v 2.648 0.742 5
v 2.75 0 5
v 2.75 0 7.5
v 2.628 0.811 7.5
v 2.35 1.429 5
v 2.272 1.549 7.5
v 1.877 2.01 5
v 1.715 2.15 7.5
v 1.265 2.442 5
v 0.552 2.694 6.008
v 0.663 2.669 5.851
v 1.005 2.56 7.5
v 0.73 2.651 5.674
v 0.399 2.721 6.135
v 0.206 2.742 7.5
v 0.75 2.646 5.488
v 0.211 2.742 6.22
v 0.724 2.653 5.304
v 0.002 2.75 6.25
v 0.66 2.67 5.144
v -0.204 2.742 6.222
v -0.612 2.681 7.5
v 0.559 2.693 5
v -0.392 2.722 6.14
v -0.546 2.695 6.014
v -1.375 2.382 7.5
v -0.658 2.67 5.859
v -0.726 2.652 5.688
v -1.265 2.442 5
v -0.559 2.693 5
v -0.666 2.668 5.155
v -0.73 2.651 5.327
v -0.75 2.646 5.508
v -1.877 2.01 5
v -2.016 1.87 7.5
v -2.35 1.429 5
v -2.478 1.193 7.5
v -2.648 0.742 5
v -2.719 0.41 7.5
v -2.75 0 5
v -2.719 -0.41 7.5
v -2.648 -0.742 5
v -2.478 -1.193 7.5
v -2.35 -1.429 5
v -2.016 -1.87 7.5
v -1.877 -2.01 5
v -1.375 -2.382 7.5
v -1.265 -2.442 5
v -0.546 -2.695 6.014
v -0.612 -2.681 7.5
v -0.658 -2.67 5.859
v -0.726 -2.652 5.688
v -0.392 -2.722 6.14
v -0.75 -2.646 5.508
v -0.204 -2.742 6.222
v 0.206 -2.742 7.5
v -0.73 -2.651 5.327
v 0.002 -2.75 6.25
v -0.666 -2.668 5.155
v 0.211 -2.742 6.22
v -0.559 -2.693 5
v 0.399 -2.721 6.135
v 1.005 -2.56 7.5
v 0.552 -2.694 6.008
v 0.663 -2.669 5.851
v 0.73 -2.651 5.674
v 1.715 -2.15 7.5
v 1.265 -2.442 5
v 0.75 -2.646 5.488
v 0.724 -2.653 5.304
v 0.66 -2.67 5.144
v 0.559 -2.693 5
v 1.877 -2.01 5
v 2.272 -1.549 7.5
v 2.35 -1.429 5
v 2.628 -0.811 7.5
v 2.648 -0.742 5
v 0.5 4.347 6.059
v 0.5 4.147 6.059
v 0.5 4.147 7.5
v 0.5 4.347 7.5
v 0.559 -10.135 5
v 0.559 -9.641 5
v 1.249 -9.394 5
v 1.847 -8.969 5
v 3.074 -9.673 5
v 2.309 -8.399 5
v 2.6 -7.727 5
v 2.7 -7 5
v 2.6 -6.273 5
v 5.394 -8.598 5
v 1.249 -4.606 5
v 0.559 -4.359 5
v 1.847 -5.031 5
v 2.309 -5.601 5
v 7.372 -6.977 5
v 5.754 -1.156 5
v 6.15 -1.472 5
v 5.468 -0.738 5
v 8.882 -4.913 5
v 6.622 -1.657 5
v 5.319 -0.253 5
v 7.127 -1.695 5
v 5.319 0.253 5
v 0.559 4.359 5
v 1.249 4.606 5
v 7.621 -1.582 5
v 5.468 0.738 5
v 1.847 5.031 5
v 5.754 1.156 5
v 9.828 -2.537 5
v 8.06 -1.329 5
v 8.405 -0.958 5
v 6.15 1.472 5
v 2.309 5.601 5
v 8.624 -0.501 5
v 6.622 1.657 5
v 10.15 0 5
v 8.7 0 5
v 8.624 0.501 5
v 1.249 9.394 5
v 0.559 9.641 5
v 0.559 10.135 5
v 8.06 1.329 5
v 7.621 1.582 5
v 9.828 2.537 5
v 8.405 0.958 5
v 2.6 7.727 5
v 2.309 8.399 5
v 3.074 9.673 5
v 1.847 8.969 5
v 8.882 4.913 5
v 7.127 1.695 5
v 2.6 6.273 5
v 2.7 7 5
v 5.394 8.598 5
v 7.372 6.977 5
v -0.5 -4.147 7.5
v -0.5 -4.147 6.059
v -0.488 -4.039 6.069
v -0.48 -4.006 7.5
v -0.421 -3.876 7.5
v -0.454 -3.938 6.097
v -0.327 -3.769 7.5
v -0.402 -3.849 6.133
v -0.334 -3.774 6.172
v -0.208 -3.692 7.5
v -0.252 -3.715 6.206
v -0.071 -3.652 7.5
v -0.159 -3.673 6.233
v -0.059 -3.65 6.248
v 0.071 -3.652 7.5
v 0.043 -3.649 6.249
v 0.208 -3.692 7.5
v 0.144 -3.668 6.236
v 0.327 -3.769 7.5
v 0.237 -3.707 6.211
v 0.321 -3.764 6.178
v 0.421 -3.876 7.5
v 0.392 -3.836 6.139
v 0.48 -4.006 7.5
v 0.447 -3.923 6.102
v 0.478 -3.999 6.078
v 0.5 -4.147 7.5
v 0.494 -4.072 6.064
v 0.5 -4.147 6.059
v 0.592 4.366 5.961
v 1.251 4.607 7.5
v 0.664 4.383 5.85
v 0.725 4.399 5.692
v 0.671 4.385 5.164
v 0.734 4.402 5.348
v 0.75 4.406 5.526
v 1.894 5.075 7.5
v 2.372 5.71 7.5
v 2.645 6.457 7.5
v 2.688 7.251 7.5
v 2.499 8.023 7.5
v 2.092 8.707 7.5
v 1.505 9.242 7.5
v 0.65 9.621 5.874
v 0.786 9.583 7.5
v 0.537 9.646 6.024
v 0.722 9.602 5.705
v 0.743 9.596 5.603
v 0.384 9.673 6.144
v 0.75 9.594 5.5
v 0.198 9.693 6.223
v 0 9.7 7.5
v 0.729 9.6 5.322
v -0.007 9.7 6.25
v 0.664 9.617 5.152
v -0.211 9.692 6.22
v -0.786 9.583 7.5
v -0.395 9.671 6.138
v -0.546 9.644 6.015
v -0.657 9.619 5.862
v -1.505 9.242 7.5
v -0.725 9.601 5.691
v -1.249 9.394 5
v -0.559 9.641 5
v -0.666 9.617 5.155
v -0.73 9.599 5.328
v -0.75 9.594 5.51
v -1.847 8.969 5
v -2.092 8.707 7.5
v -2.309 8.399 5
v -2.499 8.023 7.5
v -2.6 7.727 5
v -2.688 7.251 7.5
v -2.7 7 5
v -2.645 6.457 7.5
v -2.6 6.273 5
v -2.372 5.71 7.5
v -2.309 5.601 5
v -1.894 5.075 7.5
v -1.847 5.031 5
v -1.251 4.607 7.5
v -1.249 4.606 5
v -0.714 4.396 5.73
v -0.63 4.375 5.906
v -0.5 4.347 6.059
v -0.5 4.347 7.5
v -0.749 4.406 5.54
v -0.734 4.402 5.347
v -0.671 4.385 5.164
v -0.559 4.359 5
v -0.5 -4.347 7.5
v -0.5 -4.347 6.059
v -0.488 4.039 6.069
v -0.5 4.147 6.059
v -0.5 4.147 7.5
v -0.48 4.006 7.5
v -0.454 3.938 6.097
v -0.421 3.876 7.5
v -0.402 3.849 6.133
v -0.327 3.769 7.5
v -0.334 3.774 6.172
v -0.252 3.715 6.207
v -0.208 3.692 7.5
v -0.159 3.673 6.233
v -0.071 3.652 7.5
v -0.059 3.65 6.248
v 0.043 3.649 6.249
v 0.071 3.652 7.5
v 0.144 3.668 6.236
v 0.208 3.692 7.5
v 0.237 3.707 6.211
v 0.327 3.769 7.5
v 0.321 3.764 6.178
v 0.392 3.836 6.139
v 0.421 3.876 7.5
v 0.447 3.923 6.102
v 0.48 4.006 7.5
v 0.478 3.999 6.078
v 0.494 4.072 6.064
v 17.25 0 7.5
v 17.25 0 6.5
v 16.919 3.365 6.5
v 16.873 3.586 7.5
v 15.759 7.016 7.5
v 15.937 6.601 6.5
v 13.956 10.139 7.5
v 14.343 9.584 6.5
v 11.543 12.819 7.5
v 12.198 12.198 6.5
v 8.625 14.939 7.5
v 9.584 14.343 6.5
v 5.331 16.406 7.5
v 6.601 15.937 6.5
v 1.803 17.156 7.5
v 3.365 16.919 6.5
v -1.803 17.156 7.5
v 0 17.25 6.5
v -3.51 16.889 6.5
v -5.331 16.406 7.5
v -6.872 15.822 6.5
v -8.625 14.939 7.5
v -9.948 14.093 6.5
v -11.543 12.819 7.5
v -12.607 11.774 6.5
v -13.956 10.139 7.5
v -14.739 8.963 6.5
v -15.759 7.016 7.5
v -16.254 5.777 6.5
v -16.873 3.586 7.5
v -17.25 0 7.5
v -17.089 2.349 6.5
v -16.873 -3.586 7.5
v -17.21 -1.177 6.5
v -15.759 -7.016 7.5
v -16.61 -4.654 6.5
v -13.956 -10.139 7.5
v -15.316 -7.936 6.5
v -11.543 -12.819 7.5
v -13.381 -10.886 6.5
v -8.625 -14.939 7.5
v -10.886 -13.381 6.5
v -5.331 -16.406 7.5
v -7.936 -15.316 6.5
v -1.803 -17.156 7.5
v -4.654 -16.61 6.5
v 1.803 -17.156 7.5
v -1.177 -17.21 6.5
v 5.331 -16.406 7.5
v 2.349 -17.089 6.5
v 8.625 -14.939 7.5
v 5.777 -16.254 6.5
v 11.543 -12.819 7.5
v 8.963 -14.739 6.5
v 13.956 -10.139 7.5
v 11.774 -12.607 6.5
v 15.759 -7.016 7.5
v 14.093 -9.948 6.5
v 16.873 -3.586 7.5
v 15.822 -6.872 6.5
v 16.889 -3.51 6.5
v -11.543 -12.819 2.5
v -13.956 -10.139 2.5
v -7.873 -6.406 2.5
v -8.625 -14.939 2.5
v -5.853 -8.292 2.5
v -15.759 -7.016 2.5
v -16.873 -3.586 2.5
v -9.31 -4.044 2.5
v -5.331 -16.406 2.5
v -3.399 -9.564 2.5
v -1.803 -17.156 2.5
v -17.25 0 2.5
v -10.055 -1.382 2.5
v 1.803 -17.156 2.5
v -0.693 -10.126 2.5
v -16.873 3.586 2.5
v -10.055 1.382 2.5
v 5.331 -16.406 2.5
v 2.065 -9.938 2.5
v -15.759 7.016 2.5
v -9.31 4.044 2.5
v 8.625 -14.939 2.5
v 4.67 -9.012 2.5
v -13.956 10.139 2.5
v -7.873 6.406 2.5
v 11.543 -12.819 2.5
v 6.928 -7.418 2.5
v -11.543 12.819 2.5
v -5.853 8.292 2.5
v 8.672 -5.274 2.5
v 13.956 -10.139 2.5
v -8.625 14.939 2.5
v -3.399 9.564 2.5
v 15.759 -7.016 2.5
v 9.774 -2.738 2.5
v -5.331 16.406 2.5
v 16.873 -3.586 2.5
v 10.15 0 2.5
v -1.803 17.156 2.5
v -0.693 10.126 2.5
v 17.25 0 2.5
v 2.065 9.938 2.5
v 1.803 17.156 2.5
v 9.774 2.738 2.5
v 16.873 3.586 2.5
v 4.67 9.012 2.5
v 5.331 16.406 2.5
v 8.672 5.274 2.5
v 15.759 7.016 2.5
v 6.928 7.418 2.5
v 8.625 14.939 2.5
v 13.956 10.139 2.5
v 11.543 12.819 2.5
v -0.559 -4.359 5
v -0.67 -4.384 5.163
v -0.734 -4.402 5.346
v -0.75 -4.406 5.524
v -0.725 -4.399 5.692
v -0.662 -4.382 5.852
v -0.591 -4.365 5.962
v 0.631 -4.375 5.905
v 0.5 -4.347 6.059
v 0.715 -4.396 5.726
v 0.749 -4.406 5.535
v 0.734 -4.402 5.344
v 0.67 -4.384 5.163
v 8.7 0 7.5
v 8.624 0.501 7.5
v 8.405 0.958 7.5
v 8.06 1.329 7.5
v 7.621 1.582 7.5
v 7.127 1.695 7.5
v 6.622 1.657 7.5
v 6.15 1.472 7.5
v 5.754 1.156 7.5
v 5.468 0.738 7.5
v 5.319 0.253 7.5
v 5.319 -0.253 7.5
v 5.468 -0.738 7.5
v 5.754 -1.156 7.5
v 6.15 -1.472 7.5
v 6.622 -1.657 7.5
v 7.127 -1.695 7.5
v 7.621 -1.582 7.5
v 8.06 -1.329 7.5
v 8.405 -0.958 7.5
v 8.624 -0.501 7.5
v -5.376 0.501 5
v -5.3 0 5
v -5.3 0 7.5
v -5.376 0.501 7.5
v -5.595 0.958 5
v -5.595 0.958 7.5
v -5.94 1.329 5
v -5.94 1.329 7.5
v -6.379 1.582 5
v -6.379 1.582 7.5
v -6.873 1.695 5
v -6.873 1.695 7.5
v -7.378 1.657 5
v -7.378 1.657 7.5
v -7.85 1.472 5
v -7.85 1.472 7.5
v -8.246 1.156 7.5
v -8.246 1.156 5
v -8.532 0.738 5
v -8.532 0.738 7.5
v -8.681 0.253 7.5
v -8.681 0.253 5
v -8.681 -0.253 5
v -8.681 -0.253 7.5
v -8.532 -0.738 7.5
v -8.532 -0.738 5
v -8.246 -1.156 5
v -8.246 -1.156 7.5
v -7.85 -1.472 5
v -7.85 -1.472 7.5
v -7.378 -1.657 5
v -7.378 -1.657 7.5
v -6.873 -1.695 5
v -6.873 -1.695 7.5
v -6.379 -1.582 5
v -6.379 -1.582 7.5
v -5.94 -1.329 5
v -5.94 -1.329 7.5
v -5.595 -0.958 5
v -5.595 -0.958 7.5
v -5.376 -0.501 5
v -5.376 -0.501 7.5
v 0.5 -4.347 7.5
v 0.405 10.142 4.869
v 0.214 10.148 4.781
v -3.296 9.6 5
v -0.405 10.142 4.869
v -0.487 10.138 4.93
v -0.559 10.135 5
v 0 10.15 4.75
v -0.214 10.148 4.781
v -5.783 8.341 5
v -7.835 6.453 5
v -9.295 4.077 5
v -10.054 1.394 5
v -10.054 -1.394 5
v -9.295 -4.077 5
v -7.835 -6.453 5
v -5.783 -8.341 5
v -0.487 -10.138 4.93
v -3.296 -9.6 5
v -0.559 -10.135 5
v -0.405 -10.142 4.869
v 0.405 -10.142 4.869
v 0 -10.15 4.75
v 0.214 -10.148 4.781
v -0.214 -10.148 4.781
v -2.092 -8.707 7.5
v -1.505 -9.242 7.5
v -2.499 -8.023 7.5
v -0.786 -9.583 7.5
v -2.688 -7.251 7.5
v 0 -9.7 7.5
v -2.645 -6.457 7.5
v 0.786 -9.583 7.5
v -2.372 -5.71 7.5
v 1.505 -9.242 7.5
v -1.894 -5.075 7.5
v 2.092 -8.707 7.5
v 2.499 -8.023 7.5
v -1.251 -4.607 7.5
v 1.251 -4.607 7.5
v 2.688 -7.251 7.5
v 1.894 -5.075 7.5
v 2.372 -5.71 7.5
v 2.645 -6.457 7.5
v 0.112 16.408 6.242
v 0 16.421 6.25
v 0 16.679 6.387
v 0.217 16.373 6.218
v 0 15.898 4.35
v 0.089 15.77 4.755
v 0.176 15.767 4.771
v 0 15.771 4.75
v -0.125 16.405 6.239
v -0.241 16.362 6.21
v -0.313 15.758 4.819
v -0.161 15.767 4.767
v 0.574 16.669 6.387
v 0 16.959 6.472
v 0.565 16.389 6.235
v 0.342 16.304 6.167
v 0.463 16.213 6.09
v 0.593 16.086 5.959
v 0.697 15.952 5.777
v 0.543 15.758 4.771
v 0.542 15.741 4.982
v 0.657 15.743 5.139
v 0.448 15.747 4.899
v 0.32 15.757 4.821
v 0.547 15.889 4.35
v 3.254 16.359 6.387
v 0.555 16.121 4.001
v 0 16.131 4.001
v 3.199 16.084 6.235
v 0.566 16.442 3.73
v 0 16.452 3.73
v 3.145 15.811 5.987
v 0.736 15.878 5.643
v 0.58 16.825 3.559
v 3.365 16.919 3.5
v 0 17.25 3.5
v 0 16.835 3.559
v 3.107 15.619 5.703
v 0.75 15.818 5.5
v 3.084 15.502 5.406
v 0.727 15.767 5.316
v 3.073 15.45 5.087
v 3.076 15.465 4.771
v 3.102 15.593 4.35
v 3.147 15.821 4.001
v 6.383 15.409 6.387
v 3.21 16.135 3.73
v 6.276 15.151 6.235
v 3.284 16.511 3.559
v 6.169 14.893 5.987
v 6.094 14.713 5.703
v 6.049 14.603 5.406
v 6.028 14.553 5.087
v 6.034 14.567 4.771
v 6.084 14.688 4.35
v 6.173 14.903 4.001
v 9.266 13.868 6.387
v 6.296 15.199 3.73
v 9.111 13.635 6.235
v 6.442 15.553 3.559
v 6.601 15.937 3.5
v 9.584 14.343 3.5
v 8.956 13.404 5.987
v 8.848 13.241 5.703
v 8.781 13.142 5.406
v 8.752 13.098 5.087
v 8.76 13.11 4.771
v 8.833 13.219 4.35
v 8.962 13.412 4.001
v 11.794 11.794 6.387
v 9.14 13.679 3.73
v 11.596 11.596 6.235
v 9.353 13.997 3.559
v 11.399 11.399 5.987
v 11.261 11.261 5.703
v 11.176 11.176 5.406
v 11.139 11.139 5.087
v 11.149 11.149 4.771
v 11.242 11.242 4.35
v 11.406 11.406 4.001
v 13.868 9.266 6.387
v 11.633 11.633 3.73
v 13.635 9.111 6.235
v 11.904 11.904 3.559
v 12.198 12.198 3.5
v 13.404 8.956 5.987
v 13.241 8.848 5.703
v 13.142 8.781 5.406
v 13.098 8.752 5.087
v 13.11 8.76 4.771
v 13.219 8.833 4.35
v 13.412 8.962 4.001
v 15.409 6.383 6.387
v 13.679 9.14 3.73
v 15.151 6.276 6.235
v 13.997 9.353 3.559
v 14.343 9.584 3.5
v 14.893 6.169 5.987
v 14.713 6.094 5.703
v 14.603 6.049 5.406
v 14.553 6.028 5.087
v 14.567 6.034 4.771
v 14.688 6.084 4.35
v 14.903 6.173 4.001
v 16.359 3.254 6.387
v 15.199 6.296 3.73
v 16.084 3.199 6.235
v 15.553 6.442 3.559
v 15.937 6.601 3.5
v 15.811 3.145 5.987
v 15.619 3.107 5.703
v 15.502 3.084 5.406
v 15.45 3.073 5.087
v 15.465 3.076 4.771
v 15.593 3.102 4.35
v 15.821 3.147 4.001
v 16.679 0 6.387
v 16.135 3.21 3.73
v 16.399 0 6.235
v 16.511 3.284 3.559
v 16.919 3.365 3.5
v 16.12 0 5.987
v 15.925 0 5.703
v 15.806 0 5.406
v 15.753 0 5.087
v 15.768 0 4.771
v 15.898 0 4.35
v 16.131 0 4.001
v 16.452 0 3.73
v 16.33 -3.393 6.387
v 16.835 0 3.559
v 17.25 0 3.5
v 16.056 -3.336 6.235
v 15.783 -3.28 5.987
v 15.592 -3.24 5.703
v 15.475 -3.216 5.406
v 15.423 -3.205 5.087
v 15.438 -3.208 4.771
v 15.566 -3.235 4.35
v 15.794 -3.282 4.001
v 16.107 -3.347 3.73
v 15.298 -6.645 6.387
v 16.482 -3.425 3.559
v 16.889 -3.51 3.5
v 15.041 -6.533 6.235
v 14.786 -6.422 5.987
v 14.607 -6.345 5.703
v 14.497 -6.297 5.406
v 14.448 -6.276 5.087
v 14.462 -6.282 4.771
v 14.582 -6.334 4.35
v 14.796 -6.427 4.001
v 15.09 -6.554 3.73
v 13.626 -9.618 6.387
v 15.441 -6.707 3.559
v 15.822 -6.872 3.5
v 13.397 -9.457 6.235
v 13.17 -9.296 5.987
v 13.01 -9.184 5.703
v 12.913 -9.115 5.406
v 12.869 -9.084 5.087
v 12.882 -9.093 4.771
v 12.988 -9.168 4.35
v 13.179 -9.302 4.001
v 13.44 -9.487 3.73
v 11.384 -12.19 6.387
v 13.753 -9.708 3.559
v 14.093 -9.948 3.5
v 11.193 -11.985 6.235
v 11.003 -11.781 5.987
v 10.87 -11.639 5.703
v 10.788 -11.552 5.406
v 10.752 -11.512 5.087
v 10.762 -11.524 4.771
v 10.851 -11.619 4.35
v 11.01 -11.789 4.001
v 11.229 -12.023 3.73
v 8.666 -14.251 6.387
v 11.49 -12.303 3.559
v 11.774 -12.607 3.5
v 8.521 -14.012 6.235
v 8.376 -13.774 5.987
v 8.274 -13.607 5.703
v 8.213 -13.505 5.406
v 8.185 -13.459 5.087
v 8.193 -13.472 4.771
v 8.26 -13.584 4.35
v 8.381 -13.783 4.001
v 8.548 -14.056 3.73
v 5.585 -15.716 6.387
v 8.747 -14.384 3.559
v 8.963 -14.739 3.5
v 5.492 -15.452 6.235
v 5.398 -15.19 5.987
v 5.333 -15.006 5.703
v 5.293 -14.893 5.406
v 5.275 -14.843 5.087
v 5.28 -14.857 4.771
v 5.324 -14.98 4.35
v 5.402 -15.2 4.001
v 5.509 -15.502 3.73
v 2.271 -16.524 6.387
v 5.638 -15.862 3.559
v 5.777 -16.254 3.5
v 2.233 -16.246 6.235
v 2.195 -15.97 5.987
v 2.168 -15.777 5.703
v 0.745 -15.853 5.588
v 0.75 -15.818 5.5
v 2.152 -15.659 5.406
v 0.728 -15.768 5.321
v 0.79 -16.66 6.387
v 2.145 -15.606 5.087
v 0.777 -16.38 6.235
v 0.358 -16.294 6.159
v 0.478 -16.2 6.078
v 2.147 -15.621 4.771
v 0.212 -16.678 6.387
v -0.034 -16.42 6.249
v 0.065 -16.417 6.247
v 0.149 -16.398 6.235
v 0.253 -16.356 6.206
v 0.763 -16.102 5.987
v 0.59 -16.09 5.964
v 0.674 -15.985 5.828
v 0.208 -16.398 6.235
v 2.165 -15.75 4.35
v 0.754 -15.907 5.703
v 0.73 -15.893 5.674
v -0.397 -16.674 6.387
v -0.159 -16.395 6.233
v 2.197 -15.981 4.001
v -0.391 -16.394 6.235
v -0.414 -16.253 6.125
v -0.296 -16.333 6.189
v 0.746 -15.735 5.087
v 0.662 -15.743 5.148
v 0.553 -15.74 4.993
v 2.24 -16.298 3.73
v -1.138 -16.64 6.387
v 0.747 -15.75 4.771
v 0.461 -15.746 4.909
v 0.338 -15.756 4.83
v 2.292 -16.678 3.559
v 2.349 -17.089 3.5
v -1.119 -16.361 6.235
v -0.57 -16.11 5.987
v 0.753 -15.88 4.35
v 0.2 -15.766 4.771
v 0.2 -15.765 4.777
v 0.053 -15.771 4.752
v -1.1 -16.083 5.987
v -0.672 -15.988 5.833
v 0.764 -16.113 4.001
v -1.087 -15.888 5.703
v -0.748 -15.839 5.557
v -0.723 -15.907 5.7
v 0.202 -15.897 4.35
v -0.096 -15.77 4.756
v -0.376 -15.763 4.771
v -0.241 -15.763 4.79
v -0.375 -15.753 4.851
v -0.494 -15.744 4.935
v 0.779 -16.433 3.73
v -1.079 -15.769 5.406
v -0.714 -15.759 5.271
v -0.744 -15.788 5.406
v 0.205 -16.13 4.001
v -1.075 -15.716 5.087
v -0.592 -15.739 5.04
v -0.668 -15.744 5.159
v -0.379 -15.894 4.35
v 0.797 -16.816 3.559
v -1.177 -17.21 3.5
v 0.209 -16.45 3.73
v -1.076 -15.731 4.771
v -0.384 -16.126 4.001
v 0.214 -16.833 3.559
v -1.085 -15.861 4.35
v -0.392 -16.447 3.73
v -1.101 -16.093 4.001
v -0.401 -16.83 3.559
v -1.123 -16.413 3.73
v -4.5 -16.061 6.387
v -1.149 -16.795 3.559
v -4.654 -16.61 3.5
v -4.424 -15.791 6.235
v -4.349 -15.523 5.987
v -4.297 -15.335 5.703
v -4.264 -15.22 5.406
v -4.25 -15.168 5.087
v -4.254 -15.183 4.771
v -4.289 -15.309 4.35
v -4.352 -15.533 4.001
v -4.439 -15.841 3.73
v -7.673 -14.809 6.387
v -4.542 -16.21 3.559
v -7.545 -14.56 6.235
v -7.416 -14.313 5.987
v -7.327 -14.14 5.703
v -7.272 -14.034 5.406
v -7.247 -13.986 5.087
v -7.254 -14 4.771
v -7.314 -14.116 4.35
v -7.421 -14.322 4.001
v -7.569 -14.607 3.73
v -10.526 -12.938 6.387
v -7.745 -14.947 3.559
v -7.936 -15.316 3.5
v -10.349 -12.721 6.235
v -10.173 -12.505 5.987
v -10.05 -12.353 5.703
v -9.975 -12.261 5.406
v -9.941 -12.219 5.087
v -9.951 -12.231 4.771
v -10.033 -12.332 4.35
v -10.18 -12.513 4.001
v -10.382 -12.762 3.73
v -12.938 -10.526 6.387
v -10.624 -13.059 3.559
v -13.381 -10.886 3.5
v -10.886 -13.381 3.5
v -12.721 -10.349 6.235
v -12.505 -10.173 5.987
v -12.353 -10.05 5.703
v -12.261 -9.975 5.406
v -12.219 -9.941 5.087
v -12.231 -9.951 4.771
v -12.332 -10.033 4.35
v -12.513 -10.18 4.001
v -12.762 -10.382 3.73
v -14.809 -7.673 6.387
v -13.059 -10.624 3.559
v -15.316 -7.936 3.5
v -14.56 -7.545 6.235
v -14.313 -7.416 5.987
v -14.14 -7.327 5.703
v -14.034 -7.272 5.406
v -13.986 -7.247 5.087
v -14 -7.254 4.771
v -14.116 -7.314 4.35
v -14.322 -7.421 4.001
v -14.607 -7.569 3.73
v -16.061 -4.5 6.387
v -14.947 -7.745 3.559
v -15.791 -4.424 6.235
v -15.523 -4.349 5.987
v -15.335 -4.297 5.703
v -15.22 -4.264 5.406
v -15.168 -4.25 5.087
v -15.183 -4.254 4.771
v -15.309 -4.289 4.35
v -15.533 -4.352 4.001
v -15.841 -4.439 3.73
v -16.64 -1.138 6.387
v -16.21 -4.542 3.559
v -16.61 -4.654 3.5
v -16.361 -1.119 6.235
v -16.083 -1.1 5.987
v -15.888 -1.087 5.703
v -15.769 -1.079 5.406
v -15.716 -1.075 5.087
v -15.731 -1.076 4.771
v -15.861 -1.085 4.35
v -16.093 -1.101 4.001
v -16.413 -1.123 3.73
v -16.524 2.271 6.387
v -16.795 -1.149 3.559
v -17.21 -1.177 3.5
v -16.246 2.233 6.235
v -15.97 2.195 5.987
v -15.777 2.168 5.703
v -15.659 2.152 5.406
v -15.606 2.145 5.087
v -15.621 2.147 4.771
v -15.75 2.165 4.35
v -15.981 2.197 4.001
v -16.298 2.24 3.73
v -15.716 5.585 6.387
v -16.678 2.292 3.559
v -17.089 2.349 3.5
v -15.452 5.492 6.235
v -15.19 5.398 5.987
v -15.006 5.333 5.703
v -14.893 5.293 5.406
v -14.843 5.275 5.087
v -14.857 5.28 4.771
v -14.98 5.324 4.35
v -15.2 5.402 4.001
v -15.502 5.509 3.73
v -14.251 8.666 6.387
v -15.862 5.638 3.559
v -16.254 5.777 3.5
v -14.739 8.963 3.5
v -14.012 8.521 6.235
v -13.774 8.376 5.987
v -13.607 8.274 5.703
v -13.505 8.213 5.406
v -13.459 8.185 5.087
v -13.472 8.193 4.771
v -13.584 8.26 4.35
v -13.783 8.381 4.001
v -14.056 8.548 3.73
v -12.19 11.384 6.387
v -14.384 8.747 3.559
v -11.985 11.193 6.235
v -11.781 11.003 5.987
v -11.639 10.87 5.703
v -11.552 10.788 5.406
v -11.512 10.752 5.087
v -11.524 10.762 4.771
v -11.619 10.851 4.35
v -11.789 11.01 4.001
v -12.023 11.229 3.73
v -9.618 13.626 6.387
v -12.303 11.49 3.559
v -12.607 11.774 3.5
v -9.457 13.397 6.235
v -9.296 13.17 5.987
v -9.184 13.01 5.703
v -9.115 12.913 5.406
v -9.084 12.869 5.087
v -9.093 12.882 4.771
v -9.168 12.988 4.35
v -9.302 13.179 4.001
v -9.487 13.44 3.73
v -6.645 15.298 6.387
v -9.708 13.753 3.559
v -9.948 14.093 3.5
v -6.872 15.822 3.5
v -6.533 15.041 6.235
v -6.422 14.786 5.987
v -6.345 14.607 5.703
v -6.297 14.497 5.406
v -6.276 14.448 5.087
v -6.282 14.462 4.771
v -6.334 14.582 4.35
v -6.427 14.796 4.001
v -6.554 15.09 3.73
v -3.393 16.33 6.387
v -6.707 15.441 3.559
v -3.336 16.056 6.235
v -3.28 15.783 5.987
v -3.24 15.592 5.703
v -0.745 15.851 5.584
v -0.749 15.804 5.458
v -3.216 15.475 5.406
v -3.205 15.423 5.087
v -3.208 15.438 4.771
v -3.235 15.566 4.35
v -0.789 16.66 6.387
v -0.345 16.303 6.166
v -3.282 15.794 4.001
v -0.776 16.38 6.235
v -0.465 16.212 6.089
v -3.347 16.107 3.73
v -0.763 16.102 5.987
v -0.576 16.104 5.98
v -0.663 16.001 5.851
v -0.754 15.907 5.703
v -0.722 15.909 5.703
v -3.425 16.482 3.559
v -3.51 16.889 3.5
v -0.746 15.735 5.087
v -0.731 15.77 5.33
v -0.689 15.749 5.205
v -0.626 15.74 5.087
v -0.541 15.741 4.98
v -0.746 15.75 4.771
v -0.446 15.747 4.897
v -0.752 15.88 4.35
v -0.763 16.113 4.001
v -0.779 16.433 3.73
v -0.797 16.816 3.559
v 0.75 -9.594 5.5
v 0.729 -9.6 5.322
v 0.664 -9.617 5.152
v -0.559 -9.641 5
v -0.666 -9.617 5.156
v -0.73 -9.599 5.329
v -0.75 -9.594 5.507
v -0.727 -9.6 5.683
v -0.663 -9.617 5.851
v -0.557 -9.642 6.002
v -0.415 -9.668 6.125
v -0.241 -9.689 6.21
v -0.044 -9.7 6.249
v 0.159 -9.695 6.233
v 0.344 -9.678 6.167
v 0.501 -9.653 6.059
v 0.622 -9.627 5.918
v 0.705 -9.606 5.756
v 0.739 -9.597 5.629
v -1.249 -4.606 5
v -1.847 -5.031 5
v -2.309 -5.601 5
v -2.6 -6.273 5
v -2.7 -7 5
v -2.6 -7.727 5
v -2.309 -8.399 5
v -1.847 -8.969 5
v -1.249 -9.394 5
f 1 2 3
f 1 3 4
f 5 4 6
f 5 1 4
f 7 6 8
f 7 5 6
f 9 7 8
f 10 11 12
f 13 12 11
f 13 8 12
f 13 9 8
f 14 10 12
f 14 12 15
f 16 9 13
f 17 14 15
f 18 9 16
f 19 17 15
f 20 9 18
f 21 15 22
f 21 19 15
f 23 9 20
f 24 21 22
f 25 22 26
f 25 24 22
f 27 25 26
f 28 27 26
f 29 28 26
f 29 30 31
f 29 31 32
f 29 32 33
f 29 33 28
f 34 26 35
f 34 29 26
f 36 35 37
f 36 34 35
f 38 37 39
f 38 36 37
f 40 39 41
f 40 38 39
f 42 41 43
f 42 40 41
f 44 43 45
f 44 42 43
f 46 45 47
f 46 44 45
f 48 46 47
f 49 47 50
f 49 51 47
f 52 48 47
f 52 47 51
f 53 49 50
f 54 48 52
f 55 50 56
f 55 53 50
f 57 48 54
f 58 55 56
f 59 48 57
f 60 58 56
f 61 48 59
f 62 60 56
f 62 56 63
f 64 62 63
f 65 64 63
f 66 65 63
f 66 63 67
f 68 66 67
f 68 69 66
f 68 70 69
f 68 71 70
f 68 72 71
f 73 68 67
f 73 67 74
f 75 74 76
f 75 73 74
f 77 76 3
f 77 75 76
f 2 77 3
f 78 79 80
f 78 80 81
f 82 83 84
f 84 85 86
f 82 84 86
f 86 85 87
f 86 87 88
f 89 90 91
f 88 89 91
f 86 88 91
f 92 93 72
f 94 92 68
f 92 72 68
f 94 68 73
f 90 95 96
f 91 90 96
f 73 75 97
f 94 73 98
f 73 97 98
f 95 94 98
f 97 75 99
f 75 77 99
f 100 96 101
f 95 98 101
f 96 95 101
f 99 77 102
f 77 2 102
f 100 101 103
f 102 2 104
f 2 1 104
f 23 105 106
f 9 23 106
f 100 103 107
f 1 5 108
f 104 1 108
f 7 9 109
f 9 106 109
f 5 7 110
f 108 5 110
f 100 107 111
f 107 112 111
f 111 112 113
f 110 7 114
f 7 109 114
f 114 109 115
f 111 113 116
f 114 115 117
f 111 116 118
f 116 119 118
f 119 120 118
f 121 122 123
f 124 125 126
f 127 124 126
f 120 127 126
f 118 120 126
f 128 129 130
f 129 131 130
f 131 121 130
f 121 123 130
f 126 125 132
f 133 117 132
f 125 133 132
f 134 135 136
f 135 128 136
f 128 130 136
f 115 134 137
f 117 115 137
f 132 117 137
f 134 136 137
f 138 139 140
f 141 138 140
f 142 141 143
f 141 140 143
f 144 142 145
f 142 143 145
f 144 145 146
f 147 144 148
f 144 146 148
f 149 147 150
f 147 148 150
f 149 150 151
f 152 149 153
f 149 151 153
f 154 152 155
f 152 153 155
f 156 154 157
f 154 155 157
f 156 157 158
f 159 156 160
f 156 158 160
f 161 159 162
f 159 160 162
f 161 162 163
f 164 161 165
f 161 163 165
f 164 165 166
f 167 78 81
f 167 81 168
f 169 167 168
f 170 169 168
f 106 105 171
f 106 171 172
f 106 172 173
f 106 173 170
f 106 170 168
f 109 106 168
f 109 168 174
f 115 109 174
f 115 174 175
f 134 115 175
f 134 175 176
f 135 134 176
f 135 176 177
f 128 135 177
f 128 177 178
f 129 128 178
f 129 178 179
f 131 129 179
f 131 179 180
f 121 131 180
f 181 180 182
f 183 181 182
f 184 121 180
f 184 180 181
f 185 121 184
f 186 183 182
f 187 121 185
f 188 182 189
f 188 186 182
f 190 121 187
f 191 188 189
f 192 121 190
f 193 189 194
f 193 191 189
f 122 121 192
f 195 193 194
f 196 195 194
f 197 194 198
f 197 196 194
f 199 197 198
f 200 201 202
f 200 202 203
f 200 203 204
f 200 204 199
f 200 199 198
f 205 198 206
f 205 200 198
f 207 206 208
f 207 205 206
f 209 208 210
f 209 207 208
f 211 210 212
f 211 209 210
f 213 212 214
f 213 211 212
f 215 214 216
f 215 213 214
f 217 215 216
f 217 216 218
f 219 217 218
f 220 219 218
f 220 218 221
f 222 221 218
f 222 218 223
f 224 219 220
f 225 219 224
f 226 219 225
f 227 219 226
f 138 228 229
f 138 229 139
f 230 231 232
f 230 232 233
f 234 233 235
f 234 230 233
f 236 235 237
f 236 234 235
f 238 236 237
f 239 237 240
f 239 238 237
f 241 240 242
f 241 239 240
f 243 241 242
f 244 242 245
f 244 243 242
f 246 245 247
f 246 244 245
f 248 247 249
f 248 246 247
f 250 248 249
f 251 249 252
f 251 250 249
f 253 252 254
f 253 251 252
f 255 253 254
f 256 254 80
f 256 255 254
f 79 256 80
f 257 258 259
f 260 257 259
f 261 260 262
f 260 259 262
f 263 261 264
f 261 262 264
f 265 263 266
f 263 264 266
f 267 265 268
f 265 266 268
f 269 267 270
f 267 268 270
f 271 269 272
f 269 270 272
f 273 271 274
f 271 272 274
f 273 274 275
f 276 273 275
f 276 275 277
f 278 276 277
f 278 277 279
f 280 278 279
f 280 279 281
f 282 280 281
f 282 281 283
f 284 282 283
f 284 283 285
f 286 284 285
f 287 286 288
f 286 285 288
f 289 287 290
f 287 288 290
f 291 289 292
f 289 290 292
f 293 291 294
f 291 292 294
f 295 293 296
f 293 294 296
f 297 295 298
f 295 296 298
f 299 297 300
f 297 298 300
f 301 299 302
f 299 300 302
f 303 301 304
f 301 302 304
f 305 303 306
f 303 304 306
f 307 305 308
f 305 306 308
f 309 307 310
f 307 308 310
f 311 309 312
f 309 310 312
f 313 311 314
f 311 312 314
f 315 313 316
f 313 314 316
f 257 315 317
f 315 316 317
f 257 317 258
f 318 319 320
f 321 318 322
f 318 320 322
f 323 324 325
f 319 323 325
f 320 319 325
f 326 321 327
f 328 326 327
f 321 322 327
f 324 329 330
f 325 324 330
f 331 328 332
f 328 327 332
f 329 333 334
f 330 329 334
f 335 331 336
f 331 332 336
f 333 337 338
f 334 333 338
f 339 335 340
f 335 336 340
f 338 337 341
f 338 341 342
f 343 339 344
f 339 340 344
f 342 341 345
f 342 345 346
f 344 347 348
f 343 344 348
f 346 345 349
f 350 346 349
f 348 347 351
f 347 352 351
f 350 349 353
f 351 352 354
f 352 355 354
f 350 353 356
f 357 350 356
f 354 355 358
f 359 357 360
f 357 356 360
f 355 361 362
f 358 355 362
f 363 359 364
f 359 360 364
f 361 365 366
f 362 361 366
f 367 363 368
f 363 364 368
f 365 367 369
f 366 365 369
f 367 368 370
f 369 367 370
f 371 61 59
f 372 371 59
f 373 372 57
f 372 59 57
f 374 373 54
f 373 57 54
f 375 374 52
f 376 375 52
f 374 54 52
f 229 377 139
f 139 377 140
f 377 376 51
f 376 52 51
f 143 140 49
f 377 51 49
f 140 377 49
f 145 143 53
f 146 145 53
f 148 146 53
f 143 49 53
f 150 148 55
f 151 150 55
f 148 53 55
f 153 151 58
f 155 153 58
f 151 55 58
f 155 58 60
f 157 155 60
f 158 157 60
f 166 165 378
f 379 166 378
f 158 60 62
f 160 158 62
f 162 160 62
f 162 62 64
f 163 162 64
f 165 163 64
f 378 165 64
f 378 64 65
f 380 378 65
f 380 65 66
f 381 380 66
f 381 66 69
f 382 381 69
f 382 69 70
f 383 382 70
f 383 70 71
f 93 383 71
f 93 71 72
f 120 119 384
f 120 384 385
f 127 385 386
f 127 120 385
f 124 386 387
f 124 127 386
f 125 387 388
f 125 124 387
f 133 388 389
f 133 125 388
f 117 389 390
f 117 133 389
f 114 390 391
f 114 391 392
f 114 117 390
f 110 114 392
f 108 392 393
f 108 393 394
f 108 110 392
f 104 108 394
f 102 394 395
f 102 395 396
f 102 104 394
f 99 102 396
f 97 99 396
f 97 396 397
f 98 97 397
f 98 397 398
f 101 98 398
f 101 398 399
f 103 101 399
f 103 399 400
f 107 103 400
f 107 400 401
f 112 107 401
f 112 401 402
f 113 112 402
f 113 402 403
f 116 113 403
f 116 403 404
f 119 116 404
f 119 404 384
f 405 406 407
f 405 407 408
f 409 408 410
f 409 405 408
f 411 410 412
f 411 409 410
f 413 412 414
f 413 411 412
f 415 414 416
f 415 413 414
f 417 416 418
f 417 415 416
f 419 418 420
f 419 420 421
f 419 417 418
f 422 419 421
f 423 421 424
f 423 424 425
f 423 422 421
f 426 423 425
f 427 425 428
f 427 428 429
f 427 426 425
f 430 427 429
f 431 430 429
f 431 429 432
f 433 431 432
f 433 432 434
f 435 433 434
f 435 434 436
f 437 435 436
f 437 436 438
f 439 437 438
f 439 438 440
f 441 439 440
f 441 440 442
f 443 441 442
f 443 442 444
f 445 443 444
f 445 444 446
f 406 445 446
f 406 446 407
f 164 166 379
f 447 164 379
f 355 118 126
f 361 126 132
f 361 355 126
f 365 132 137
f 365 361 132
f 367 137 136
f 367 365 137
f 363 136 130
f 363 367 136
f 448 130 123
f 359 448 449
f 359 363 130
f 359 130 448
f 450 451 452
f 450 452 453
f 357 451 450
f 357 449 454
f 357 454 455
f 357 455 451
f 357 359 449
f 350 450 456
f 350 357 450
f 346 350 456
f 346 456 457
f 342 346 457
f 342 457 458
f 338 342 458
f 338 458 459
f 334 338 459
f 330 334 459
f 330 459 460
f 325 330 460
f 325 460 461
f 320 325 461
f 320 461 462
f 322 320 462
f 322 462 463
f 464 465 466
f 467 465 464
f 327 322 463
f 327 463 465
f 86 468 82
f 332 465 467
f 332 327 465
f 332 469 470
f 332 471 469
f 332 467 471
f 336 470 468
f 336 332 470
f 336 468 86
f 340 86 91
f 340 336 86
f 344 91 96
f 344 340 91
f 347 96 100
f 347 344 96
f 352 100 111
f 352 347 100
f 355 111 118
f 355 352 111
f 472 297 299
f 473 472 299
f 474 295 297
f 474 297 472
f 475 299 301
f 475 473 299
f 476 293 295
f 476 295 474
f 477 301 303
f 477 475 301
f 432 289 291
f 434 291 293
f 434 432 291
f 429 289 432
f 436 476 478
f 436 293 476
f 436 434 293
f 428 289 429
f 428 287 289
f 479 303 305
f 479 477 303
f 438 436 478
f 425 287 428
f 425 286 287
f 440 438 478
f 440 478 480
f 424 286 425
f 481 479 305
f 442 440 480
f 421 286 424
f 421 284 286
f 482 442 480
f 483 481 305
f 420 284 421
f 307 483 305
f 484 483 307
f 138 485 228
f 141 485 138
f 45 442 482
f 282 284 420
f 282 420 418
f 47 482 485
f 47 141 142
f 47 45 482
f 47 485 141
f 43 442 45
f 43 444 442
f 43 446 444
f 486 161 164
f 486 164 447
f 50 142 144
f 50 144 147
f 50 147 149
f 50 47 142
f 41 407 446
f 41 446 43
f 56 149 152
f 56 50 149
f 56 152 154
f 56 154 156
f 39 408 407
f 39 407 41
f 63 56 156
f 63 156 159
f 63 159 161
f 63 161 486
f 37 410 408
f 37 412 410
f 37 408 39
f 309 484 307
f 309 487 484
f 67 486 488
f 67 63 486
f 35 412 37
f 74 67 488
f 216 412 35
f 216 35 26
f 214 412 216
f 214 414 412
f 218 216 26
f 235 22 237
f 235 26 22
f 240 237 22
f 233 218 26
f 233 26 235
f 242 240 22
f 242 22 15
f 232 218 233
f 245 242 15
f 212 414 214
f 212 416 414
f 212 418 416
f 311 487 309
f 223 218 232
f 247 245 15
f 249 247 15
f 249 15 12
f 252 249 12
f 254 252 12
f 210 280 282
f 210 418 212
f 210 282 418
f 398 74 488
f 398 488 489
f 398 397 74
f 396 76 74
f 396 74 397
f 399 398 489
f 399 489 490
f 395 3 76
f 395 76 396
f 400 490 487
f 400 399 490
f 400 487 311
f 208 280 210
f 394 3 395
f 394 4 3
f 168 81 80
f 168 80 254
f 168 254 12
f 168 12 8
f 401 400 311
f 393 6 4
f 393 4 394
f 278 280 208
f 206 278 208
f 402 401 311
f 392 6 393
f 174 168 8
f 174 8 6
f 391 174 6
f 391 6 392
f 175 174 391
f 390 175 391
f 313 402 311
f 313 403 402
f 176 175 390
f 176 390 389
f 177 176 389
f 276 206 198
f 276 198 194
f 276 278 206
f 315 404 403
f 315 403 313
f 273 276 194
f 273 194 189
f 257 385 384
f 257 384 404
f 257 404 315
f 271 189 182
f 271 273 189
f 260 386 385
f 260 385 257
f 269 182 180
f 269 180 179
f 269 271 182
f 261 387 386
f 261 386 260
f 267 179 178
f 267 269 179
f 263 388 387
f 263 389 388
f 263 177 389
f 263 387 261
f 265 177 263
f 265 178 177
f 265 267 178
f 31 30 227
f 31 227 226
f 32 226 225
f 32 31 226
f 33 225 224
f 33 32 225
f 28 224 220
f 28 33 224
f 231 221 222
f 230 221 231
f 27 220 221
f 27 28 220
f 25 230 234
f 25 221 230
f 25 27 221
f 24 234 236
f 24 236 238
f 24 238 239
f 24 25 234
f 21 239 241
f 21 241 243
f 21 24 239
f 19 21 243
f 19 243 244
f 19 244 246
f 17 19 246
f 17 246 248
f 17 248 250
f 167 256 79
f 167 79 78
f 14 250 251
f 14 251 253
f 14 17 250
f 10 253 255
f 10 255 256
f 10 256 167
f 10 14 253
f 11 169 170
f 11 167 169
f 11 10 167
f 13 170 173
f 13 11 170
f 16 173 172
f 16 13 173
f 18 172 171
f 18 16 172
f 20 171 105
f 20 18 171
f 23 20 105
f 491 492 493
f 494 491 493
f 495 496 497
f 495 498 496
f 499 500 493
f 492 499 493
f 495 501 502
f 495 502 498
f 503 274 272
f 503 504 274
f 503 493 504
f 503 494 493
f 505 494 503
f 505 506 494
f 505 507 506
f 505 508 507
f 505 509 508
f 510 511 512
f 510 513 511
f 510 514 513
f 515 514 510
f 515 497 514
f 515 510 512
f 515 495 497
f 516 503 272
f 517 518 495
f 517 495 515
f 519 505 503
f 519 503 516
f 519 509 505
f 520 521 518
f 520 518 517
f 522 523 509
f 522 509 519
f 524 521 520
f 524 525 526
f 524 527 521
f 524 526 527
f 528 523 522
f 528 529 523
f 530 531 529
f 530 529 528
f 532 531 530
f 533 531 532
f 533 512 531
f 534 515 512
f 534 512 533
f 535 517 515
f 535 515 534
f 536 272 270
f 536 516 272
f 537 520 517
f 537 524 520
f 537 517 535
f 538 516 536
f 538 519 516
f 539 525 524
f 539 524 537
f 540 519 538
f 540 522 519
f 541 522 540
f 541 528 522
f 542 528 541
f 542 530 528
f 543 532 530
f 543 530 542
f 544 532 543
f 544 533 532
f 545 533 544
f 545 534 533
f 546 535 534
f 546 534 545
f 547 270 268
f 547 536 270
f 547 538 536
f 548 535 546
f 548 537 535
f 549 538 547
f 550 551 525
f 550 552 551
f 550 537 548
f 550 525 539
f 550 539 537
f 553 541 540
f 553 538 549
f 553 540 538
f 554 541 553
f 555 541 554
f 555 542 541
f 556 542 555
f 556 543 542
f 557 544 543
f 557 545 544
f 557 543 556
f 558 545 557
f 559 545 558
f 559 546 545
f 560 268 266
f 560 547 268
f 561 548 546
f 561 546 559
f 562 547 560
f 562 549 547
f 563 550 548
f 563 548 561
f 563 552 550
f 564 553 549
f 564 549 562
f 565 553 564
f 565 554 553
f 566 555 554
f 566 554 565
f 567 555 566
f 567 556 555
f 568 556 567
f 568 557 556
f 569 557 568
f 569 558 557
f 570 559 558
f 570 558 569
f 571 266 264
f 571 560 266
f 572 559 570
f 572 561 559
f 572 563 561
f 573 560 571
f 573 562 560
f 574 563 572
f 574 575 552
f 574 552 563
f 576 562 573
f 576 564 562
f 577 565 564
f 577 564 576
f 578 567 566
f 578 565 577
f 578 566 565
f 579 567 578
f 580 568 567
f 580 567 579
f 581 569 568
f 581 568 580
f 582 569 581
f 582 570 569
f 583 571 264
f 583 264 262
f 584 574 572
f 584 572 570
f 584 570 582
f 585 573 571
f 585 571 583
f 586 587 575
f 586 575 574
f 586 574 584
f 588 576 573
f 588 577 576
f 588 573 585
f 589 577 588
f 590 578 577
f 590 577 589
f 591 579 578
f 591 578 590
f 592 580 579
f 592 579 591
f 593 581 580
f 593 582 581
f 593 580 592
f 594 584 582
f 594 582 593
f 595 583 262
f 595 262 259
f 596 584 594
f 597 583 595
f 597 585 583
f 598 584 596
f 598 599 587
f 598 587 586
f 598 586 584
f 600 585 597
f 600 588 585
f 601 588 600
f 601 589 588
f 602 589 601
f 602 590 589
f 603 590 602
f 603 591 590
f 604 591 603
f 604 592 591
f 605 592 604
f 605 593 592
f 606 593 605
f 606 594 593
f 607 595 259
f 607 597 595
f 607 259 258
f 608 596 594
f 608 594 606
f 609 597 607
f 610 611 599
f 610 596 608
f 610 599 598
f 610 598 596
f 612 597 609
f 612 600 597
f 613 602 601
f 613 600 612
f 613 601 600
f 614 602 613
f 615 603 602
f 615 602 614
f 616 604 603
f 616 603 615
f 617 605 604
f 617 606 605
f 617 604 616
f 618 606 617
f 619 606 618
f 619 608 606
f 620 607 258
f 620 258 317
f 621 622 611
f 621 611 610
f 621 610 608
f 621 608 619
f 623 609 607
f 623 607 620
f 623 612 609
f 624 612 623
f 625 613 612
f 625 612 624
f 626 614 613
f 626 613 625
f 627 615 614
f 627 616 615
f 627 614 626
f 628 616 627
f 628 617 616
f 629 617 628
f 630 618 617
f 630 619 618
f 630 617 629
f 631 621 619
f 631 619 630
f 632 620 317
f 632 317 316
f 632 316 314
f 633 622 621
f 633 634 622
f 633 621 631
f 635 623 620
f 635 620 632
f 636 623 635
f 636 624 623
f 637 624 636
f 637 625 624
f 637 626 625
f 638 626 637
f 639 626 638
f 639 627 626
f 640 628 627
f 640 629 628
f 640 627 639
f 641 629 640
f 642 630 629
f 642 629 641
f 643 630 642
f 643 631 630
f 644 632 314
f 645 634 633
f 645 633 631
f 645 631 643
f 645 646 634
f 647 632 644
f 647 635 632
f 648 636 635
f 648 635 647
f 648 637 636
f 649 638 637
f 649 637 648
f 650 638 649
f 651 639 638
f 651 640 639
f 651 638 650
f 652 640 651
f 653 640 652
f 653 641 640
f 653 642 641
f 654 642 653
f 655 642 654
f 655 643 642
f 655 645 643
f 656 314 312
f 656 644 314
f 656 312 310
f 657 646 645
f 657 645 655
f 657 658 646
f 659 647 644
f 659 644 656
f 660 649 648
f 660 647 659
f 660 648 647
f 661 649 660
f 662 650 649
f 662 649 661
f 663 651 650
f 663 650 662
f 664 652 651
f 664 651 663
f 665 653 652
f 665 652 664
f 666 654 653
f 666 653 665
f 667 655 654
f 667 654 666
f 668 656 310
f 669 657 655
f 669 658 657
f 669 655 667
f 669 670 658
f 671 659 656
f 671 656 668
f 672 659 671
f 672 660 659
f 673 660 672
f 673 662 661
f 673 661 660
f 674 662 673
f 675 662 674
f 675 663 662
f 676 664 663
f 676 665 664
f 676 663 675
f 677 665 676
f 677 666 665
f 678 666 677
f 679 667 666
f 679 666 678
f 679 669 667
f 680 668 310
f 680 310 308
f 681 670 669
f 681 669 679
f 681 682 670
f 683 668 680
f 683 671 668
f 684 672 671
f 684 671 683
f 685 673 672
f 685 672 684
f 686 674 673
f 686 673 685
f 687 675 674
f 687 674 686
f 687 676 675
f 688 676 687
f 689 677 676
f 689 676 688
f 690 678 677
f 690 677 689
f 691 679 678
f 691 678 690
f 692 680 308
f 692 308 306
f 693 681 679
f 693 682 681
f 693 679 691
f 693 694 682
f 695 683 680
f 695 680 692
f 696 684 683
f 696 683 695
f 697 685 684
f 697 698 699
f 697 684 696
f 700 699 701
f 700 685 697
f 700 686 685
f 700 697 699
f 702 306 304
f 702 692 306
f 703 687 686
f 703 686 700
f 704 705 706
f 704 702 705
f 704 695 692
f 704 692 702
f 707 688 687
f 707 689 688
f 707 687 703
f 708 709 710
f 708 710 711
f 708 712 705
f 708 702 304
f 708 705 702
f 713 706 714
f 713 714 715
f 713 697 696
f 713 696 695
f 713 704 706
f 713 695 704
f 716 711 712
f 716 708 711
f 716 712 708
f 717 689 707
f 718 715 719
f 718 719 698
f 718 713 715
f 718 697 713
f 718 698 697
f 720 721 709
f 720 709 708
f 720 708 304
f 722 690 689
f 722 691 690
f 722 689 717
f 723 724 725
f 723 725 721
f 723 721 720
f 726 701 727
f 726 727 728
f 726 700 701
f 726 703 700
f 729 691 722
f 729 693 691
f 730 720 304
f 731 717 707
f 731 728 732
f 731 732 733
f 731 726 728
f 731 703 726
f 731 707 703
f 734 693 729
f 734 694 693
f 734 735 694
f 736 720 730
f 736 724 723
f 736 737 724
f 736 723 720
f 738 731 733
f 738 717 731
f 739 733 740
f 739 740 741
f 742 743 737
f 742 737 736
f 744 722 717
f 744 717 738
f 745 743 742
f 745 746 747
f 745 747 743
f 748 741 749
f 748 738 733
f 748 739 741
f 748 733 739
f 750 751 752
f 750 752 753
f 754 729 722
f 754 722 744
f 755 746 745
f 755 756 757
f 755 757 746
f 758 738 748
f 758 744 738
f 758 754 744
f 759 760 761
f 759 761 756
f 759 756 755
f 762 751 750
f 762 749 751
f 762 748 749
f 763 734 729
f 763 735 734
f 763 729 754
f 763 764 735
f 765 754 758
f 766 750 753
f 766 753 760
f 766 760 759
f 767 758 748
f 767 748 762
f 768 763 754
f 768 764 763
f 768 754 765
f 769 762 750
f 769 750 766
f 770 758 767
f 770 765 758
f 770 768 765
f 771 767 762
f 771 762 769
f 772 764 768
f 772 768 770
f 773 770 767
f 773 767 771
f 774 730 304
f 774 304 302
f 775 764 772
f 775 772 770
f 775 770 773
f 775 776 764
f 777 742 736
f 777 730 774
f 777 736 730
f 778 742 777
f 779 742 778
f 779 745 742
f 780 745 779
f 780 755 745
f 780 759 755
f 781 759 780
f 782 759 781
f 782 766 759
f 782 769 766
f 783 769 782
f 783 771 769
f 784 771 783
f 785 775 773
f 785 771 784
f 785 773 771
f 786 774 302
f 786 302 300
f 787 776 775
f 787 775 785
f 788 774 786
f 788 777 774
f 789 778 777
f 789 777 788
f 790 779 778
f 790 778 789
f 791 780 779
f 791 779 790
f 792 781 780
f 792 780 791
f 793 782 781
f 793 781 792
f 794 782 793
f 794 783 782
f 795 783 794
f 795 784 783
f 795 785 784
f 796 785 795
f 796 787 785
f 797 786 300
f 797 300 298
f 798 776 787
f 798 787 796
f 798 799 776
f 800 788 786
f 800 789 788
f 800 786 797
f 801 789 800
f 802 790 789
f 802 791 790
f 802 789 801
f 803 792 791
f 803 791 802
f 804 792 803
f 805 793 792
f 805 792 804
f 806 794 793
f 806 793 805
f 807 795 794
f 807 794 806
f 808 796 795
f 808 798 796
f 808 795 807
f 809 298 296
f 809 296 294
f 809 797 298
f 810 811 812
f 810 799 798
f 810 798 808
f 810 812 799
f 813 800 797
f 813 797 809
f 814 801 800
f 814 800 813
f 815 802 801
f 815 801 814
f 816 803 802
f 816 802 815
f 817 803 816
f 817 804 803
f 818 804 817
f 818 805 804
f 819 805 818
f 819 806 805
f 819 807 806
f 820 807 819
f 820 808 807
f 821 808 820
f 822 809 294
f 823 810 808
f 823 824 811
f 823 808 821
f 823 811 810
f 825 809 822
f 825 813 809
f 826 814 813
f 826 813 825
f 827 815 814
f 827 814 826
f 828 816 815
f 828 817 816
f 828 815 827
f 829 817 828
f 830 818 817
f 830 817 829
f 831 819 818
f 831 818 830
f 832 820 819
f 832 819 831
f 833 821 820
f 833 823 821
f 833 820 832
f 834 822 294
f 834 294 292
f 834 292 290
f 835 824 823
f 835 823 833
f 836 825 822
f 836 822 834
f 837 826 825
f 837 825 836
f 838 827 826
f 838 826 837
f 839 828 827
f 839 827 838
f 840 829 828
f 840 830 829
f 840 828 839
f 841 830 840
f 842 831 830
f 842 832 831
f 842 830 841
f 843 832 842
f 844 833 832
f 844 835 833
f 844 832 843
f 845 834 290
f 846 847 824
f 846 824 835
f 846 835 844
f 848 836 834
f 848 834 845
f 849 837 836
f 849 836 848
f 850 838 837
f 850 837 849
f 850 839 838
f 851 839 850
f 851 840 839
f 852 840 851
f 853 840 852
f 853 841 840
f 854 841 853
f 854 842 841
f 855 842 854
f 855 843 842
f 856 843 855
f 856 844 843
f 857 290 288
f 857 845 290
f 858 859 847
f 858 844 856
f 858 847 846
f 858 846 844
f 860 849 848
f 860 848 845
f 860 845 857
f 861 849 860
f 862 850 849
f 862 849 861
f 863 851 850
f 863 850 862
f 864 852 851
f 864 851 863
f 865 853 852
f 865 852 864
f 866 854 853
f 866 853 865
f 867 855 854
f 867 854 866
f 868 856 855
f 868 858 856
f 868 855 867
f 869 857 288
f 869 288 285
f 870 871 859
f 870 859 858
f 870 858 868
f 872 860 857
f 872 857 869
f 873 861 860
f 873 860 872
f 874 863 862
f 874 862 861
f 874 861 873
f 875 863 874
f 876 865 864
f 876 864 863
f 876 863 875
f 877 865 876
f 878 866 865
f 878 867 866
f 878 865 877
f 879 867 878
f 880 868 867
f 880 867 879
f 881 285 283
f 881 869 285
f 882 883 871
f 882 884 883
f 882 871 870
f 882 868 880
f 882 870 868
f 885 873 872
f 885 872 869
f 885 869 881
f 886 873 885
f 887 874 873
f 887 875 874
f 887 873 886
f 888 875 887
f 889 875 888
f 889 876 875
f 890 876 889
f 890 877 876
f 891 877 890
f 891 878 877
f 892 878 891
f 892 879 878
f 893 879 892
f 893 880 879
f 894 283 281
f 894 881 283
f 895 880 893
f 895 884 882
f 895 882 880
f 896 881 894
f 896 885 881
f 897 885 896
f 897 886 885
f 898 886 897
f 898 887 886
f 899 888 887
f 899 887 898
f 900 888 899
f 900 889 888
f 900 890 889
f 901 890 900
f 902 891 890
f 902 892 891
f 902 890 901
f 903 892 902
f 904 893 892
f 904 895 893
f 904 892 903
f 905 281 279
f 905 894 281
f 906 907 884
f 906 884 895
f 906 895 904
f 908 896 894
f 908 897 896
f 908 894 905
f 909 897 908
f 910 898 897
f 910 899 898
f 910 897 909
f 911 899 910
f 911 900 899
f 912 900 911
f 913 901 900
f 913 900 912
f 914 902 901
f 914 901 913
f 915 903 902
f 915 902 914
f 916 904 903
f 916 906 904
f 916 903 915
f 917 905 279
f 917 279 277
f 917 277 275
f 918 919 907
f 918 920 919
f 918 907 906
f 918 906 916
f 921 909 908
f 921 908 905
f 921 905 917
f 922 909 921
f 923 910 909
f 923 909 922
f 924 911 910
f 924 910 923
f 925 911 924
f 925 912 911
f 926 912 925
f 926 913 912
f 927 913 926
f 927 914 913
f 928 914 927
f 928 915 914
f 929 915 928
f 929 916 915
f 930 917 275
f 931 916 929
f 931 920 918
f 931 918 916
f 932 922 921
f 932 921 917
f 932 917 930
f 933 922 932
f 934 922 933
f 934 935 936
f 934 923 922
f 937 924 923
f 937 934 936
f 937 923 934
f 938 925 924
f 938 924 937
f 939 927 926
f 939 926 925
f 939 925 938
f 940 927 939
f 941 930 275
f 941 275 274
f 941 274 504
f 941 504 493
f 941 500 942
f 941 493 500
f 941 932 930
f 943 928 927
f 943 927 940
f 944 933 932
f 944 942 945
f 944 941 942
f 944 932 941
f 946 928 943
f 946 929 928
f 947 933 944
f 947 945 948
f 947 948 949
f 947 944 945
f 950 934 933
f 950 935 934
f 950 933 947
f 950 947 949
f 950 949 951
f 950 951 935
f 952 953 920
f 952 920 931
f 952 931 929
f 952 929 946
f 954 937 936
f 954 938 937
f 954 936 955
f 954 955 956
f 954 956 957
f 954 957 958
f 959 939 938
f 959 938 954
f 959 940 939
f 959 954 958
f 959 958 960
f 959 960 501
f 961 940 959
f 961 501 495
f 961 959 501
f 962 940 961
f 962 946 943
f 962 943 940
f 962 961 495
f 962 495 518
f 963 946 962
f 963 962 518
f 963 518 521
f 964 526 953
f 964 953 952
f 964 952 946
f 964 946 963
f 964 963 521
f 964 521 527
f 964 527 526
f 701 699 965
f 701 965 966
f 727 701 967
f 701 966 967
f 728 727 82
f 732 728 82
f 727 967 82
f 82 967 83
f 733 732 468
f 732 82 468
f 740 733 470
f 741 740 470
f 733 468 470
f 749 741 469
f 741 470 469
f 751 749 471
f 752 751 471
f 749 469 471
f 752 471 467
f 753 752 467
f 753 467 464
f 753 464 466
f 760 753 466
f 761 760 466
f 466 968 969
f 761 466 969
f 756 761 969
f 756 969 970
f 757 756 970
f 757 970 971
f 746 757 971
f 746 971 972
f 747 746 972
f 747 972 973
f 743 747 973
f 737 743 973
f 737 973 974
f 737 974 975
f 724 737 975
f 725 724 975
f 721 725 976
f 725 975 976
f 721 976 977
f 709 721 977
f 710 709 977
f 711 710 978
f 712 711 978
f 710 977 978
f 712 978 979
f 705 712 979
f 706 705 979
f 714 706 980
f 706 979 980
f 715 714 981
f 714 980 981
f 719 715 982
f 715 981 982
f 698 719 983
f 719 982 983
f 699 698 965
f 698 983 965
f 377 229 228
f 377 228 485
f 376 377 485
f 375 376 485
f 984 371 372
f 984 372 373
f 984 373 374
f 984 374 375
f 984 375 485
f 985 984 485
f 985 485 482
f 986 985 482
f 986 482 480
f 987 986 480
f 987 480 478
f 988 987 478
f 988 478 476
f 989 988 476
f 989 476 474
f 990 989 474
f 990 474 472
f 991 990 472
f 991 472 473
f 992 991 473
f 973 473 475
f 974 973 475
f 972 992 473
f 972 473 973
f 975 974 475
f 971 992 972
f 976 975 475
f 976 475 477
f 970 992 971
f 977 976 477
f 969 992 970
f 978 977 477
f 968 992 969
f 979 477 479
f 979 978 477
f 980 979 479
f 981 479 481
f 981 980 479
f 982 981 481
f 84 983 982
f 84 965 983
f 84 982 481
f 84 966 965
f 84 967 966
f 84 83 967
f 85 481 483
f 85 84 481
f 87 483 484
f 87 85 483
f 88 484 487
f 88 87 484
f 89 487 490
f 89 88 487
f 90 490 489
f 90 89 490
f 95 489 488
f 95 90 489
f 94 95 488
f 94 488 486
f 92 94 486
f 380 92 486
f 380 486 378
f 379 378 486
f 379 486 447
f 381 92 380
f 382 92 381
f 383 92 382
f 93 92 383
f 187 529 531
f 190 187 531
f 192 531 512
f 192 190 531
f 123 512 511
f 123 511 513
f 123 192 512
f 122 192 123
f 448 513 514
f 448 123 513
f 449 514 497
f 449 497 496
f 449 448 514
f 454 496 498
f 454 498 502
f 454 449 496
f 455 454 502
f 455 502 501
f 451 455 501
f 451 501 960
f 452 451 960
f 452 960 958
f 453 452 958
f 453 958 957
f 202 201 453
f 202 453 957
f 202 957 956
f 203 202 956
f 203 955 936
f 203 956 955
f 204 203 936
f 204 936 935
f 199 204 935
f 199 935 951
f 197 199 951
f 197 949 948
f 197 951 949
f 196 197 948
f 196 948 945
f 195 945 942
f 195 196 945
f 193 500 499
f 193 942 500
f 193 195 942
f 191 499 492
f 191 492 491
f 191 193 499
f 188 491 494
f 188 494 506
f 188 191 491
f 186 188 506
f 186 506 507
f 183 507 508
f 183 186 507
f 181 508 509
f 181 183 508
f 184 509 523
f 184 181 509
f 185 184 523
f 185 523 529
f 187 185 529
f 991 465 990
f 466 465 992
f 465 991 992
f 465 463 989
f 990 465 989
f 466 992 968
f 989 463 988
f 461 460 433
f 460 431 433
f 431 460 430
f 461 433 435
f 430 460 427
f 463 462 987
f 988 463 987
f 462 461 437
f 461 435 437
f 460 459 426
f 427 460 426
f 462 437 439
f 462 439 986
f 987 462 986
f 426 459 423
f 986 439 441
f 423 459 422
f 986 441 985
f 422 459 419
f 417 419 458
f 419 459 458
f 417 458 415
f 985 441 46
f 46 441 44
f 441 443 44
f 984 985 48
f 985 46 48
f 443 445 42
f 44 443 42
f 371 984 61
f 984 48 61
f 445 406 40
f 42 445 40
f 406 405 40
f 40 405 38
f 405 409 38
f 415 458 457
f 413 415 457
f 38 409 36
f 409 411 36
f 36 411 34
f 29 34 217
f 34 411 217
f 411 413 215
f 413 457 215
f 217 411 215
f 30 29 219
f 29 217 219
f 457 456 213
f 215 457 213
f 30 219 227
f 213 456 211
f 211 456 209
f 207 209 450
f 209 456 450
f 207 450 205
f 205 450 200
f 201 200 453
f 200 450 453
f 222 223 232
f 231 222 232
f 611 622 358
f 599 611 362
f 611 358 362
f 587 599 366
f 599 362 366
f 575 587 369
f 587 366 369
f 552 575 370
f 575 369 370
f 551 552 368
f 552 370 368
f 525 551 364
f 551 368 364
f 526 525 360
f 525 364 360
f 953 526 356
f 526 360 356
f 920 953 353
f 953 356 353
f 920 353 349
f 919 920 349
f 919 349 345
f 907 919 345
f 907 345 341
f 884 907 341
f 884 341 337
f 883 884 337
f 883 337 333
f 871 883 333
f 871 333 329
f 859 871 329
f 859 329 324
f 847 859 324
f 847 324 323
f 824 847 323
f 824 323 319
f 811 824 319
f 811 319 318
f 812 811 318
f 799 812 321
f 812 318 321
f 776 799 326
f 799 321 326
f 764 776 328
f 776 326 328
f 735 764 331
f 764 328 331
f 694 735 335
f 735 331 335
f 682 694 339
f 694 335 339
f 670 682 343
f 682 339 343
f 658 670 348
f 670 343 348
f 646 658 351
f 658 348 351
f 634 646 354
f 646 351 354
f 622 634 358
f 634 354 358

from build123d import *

# Parameters (mm, degrees)
SKETCH065_R             = 17.25
SKETCH065_R_2           = 2.75
SKETCH065_R_3           = 1.7
PAD030_DEPTH            = 5
SKETCH066_R             = 2.7
POCKET034_DEPTH         = 101.092794
POLARPATTERN006_COUNT   = 2
SKETCH068_R             = 0.75
POCKET035_DEPTH         = 17.251
POCKET035_DEPTH_BACK    = 17.251
SKETCH078_R             = 10.15
POCKET045_DEPTH         = 2.5
POCKET046_DEPTH         = 103.092794
BODY017_PLACEMENT_ANGLE = 270


with BuildPart() as part:
    # Sketch065 → Pad030 (new body)
    with BuildSketch(Plane.XZ):
        Circle(SKETCH065_R)
        Circle(SKETCH065_R_2, mode=Mode.SUBTRACT)
        with Locations((0, 7)):
            Circle(SKETCH065_R_3, mode=Mode.SUBTRACT)
        with Locations((-7, 0)):
            Circle(SKETCH065_R_3, mode=Mode.SUBTRACT)
        with Locations((0, -7)):
            Circle(SKETCH065_R_3, mode=Mode.SUBTRACT)
        with Locations((7, 0)):
            Circle(SKETCH065_R_3, mode=Mode.SUBTRACT)
    extrude(amount=PAD030_DEPTH)

    # Sketch066 → Pocket034 (cut, through all)
    with BuildSketch(Plane.XZ.offset(2)):
        with Locations((0, 7)):
            Circle(SKETCH066_R)
    pocket034 = extrude(amount=POCKET034_DEPTH, mode=Mode.SUBTRACT)

    # PolarPattern006: Pocket034 ×2 about axis
    polarpattern006_axis = Axis((0, -2, 0), (0, -1, 0))
    for i in range(1, POLARPATTERN006_COUNT):
        add(pocket034.rotate(polarpattern006_axis, i * 360 / POLARPATTERN006_COUNT), mode=Mode.SUBTRACT)

    # Sketch067 → Groove004 (revolve, cut)
    with BuildSketch(Plane.YZ):
        with BuildLine():
            ThreePointArc((-4, 17.25), (-2.5, 15.75), (-1, 17.25))
            Line((-4, 17.25), (-1, 17.25))
        make_face()
    revolve(axis=Axis((0, 0, 0), (0, 1, 0)), mode=Mode.SUBTRACT)

    # Sketch068 → Pocket035 (cut, two sides)
    with BuildSketch(Plane.XY) as pocket035_sk:
        with Locations((0, -3)):
            Circle(SKETCH068_R)
    extrude(amount=-POCKET035_DEPTH, mode=Mode.SUBTRACT)
    extrude(pocket035_sk.sketch, amount=POCKET035_DEPTH_BACK, mode=Mode.SUBTRACT)

    # Sketch078 → Pocket045 (cut)
    with BuildSketch(Plane.XZ):
        Circle(SKETCH078_R)
    extrude(amount=POCKET045_DEPTH, mode=Mode.SUBTRACT)

    # Sketch080 → Pocket046 (cut, through all)
    with BuildSketch(Plane.XZ):
        with BuildLine():
            ThreePointArc((-0.5, 4.146692), (4e-06, 3.646692), (0.5, 4.1467))
            Line((0.5, 4.1467), (0.5, 4.3467))
            Line((0.5, 4.3467), (-0.5, 4.3467))
            Line((-0.5, 4.3467), (-0.5, 4.146692))
        make_face()
    pocket046 = extrude(amount=POCKET046_DEPTH, mode=Mode.SUBTRACT)

    # Mirrored008: Pocket046 across Sketch080 H_Axis
    add(pocket046.mirror(Plane(origin=(0, 0, 0), x_dir=(0, -1, 0), z_dir=(0, 0, 1))), mode=Mode.SUBTRACT)


with BuildPart() as part_1:
    # Body017 placement: moved
    add(part.part.moved(Location((0, 0, 2.5))).rotate(Axis((0, 0, 2.5), (1, 0, 0)), BODY017_PLACEMENT_ANGLE))


solid = part_1.part
